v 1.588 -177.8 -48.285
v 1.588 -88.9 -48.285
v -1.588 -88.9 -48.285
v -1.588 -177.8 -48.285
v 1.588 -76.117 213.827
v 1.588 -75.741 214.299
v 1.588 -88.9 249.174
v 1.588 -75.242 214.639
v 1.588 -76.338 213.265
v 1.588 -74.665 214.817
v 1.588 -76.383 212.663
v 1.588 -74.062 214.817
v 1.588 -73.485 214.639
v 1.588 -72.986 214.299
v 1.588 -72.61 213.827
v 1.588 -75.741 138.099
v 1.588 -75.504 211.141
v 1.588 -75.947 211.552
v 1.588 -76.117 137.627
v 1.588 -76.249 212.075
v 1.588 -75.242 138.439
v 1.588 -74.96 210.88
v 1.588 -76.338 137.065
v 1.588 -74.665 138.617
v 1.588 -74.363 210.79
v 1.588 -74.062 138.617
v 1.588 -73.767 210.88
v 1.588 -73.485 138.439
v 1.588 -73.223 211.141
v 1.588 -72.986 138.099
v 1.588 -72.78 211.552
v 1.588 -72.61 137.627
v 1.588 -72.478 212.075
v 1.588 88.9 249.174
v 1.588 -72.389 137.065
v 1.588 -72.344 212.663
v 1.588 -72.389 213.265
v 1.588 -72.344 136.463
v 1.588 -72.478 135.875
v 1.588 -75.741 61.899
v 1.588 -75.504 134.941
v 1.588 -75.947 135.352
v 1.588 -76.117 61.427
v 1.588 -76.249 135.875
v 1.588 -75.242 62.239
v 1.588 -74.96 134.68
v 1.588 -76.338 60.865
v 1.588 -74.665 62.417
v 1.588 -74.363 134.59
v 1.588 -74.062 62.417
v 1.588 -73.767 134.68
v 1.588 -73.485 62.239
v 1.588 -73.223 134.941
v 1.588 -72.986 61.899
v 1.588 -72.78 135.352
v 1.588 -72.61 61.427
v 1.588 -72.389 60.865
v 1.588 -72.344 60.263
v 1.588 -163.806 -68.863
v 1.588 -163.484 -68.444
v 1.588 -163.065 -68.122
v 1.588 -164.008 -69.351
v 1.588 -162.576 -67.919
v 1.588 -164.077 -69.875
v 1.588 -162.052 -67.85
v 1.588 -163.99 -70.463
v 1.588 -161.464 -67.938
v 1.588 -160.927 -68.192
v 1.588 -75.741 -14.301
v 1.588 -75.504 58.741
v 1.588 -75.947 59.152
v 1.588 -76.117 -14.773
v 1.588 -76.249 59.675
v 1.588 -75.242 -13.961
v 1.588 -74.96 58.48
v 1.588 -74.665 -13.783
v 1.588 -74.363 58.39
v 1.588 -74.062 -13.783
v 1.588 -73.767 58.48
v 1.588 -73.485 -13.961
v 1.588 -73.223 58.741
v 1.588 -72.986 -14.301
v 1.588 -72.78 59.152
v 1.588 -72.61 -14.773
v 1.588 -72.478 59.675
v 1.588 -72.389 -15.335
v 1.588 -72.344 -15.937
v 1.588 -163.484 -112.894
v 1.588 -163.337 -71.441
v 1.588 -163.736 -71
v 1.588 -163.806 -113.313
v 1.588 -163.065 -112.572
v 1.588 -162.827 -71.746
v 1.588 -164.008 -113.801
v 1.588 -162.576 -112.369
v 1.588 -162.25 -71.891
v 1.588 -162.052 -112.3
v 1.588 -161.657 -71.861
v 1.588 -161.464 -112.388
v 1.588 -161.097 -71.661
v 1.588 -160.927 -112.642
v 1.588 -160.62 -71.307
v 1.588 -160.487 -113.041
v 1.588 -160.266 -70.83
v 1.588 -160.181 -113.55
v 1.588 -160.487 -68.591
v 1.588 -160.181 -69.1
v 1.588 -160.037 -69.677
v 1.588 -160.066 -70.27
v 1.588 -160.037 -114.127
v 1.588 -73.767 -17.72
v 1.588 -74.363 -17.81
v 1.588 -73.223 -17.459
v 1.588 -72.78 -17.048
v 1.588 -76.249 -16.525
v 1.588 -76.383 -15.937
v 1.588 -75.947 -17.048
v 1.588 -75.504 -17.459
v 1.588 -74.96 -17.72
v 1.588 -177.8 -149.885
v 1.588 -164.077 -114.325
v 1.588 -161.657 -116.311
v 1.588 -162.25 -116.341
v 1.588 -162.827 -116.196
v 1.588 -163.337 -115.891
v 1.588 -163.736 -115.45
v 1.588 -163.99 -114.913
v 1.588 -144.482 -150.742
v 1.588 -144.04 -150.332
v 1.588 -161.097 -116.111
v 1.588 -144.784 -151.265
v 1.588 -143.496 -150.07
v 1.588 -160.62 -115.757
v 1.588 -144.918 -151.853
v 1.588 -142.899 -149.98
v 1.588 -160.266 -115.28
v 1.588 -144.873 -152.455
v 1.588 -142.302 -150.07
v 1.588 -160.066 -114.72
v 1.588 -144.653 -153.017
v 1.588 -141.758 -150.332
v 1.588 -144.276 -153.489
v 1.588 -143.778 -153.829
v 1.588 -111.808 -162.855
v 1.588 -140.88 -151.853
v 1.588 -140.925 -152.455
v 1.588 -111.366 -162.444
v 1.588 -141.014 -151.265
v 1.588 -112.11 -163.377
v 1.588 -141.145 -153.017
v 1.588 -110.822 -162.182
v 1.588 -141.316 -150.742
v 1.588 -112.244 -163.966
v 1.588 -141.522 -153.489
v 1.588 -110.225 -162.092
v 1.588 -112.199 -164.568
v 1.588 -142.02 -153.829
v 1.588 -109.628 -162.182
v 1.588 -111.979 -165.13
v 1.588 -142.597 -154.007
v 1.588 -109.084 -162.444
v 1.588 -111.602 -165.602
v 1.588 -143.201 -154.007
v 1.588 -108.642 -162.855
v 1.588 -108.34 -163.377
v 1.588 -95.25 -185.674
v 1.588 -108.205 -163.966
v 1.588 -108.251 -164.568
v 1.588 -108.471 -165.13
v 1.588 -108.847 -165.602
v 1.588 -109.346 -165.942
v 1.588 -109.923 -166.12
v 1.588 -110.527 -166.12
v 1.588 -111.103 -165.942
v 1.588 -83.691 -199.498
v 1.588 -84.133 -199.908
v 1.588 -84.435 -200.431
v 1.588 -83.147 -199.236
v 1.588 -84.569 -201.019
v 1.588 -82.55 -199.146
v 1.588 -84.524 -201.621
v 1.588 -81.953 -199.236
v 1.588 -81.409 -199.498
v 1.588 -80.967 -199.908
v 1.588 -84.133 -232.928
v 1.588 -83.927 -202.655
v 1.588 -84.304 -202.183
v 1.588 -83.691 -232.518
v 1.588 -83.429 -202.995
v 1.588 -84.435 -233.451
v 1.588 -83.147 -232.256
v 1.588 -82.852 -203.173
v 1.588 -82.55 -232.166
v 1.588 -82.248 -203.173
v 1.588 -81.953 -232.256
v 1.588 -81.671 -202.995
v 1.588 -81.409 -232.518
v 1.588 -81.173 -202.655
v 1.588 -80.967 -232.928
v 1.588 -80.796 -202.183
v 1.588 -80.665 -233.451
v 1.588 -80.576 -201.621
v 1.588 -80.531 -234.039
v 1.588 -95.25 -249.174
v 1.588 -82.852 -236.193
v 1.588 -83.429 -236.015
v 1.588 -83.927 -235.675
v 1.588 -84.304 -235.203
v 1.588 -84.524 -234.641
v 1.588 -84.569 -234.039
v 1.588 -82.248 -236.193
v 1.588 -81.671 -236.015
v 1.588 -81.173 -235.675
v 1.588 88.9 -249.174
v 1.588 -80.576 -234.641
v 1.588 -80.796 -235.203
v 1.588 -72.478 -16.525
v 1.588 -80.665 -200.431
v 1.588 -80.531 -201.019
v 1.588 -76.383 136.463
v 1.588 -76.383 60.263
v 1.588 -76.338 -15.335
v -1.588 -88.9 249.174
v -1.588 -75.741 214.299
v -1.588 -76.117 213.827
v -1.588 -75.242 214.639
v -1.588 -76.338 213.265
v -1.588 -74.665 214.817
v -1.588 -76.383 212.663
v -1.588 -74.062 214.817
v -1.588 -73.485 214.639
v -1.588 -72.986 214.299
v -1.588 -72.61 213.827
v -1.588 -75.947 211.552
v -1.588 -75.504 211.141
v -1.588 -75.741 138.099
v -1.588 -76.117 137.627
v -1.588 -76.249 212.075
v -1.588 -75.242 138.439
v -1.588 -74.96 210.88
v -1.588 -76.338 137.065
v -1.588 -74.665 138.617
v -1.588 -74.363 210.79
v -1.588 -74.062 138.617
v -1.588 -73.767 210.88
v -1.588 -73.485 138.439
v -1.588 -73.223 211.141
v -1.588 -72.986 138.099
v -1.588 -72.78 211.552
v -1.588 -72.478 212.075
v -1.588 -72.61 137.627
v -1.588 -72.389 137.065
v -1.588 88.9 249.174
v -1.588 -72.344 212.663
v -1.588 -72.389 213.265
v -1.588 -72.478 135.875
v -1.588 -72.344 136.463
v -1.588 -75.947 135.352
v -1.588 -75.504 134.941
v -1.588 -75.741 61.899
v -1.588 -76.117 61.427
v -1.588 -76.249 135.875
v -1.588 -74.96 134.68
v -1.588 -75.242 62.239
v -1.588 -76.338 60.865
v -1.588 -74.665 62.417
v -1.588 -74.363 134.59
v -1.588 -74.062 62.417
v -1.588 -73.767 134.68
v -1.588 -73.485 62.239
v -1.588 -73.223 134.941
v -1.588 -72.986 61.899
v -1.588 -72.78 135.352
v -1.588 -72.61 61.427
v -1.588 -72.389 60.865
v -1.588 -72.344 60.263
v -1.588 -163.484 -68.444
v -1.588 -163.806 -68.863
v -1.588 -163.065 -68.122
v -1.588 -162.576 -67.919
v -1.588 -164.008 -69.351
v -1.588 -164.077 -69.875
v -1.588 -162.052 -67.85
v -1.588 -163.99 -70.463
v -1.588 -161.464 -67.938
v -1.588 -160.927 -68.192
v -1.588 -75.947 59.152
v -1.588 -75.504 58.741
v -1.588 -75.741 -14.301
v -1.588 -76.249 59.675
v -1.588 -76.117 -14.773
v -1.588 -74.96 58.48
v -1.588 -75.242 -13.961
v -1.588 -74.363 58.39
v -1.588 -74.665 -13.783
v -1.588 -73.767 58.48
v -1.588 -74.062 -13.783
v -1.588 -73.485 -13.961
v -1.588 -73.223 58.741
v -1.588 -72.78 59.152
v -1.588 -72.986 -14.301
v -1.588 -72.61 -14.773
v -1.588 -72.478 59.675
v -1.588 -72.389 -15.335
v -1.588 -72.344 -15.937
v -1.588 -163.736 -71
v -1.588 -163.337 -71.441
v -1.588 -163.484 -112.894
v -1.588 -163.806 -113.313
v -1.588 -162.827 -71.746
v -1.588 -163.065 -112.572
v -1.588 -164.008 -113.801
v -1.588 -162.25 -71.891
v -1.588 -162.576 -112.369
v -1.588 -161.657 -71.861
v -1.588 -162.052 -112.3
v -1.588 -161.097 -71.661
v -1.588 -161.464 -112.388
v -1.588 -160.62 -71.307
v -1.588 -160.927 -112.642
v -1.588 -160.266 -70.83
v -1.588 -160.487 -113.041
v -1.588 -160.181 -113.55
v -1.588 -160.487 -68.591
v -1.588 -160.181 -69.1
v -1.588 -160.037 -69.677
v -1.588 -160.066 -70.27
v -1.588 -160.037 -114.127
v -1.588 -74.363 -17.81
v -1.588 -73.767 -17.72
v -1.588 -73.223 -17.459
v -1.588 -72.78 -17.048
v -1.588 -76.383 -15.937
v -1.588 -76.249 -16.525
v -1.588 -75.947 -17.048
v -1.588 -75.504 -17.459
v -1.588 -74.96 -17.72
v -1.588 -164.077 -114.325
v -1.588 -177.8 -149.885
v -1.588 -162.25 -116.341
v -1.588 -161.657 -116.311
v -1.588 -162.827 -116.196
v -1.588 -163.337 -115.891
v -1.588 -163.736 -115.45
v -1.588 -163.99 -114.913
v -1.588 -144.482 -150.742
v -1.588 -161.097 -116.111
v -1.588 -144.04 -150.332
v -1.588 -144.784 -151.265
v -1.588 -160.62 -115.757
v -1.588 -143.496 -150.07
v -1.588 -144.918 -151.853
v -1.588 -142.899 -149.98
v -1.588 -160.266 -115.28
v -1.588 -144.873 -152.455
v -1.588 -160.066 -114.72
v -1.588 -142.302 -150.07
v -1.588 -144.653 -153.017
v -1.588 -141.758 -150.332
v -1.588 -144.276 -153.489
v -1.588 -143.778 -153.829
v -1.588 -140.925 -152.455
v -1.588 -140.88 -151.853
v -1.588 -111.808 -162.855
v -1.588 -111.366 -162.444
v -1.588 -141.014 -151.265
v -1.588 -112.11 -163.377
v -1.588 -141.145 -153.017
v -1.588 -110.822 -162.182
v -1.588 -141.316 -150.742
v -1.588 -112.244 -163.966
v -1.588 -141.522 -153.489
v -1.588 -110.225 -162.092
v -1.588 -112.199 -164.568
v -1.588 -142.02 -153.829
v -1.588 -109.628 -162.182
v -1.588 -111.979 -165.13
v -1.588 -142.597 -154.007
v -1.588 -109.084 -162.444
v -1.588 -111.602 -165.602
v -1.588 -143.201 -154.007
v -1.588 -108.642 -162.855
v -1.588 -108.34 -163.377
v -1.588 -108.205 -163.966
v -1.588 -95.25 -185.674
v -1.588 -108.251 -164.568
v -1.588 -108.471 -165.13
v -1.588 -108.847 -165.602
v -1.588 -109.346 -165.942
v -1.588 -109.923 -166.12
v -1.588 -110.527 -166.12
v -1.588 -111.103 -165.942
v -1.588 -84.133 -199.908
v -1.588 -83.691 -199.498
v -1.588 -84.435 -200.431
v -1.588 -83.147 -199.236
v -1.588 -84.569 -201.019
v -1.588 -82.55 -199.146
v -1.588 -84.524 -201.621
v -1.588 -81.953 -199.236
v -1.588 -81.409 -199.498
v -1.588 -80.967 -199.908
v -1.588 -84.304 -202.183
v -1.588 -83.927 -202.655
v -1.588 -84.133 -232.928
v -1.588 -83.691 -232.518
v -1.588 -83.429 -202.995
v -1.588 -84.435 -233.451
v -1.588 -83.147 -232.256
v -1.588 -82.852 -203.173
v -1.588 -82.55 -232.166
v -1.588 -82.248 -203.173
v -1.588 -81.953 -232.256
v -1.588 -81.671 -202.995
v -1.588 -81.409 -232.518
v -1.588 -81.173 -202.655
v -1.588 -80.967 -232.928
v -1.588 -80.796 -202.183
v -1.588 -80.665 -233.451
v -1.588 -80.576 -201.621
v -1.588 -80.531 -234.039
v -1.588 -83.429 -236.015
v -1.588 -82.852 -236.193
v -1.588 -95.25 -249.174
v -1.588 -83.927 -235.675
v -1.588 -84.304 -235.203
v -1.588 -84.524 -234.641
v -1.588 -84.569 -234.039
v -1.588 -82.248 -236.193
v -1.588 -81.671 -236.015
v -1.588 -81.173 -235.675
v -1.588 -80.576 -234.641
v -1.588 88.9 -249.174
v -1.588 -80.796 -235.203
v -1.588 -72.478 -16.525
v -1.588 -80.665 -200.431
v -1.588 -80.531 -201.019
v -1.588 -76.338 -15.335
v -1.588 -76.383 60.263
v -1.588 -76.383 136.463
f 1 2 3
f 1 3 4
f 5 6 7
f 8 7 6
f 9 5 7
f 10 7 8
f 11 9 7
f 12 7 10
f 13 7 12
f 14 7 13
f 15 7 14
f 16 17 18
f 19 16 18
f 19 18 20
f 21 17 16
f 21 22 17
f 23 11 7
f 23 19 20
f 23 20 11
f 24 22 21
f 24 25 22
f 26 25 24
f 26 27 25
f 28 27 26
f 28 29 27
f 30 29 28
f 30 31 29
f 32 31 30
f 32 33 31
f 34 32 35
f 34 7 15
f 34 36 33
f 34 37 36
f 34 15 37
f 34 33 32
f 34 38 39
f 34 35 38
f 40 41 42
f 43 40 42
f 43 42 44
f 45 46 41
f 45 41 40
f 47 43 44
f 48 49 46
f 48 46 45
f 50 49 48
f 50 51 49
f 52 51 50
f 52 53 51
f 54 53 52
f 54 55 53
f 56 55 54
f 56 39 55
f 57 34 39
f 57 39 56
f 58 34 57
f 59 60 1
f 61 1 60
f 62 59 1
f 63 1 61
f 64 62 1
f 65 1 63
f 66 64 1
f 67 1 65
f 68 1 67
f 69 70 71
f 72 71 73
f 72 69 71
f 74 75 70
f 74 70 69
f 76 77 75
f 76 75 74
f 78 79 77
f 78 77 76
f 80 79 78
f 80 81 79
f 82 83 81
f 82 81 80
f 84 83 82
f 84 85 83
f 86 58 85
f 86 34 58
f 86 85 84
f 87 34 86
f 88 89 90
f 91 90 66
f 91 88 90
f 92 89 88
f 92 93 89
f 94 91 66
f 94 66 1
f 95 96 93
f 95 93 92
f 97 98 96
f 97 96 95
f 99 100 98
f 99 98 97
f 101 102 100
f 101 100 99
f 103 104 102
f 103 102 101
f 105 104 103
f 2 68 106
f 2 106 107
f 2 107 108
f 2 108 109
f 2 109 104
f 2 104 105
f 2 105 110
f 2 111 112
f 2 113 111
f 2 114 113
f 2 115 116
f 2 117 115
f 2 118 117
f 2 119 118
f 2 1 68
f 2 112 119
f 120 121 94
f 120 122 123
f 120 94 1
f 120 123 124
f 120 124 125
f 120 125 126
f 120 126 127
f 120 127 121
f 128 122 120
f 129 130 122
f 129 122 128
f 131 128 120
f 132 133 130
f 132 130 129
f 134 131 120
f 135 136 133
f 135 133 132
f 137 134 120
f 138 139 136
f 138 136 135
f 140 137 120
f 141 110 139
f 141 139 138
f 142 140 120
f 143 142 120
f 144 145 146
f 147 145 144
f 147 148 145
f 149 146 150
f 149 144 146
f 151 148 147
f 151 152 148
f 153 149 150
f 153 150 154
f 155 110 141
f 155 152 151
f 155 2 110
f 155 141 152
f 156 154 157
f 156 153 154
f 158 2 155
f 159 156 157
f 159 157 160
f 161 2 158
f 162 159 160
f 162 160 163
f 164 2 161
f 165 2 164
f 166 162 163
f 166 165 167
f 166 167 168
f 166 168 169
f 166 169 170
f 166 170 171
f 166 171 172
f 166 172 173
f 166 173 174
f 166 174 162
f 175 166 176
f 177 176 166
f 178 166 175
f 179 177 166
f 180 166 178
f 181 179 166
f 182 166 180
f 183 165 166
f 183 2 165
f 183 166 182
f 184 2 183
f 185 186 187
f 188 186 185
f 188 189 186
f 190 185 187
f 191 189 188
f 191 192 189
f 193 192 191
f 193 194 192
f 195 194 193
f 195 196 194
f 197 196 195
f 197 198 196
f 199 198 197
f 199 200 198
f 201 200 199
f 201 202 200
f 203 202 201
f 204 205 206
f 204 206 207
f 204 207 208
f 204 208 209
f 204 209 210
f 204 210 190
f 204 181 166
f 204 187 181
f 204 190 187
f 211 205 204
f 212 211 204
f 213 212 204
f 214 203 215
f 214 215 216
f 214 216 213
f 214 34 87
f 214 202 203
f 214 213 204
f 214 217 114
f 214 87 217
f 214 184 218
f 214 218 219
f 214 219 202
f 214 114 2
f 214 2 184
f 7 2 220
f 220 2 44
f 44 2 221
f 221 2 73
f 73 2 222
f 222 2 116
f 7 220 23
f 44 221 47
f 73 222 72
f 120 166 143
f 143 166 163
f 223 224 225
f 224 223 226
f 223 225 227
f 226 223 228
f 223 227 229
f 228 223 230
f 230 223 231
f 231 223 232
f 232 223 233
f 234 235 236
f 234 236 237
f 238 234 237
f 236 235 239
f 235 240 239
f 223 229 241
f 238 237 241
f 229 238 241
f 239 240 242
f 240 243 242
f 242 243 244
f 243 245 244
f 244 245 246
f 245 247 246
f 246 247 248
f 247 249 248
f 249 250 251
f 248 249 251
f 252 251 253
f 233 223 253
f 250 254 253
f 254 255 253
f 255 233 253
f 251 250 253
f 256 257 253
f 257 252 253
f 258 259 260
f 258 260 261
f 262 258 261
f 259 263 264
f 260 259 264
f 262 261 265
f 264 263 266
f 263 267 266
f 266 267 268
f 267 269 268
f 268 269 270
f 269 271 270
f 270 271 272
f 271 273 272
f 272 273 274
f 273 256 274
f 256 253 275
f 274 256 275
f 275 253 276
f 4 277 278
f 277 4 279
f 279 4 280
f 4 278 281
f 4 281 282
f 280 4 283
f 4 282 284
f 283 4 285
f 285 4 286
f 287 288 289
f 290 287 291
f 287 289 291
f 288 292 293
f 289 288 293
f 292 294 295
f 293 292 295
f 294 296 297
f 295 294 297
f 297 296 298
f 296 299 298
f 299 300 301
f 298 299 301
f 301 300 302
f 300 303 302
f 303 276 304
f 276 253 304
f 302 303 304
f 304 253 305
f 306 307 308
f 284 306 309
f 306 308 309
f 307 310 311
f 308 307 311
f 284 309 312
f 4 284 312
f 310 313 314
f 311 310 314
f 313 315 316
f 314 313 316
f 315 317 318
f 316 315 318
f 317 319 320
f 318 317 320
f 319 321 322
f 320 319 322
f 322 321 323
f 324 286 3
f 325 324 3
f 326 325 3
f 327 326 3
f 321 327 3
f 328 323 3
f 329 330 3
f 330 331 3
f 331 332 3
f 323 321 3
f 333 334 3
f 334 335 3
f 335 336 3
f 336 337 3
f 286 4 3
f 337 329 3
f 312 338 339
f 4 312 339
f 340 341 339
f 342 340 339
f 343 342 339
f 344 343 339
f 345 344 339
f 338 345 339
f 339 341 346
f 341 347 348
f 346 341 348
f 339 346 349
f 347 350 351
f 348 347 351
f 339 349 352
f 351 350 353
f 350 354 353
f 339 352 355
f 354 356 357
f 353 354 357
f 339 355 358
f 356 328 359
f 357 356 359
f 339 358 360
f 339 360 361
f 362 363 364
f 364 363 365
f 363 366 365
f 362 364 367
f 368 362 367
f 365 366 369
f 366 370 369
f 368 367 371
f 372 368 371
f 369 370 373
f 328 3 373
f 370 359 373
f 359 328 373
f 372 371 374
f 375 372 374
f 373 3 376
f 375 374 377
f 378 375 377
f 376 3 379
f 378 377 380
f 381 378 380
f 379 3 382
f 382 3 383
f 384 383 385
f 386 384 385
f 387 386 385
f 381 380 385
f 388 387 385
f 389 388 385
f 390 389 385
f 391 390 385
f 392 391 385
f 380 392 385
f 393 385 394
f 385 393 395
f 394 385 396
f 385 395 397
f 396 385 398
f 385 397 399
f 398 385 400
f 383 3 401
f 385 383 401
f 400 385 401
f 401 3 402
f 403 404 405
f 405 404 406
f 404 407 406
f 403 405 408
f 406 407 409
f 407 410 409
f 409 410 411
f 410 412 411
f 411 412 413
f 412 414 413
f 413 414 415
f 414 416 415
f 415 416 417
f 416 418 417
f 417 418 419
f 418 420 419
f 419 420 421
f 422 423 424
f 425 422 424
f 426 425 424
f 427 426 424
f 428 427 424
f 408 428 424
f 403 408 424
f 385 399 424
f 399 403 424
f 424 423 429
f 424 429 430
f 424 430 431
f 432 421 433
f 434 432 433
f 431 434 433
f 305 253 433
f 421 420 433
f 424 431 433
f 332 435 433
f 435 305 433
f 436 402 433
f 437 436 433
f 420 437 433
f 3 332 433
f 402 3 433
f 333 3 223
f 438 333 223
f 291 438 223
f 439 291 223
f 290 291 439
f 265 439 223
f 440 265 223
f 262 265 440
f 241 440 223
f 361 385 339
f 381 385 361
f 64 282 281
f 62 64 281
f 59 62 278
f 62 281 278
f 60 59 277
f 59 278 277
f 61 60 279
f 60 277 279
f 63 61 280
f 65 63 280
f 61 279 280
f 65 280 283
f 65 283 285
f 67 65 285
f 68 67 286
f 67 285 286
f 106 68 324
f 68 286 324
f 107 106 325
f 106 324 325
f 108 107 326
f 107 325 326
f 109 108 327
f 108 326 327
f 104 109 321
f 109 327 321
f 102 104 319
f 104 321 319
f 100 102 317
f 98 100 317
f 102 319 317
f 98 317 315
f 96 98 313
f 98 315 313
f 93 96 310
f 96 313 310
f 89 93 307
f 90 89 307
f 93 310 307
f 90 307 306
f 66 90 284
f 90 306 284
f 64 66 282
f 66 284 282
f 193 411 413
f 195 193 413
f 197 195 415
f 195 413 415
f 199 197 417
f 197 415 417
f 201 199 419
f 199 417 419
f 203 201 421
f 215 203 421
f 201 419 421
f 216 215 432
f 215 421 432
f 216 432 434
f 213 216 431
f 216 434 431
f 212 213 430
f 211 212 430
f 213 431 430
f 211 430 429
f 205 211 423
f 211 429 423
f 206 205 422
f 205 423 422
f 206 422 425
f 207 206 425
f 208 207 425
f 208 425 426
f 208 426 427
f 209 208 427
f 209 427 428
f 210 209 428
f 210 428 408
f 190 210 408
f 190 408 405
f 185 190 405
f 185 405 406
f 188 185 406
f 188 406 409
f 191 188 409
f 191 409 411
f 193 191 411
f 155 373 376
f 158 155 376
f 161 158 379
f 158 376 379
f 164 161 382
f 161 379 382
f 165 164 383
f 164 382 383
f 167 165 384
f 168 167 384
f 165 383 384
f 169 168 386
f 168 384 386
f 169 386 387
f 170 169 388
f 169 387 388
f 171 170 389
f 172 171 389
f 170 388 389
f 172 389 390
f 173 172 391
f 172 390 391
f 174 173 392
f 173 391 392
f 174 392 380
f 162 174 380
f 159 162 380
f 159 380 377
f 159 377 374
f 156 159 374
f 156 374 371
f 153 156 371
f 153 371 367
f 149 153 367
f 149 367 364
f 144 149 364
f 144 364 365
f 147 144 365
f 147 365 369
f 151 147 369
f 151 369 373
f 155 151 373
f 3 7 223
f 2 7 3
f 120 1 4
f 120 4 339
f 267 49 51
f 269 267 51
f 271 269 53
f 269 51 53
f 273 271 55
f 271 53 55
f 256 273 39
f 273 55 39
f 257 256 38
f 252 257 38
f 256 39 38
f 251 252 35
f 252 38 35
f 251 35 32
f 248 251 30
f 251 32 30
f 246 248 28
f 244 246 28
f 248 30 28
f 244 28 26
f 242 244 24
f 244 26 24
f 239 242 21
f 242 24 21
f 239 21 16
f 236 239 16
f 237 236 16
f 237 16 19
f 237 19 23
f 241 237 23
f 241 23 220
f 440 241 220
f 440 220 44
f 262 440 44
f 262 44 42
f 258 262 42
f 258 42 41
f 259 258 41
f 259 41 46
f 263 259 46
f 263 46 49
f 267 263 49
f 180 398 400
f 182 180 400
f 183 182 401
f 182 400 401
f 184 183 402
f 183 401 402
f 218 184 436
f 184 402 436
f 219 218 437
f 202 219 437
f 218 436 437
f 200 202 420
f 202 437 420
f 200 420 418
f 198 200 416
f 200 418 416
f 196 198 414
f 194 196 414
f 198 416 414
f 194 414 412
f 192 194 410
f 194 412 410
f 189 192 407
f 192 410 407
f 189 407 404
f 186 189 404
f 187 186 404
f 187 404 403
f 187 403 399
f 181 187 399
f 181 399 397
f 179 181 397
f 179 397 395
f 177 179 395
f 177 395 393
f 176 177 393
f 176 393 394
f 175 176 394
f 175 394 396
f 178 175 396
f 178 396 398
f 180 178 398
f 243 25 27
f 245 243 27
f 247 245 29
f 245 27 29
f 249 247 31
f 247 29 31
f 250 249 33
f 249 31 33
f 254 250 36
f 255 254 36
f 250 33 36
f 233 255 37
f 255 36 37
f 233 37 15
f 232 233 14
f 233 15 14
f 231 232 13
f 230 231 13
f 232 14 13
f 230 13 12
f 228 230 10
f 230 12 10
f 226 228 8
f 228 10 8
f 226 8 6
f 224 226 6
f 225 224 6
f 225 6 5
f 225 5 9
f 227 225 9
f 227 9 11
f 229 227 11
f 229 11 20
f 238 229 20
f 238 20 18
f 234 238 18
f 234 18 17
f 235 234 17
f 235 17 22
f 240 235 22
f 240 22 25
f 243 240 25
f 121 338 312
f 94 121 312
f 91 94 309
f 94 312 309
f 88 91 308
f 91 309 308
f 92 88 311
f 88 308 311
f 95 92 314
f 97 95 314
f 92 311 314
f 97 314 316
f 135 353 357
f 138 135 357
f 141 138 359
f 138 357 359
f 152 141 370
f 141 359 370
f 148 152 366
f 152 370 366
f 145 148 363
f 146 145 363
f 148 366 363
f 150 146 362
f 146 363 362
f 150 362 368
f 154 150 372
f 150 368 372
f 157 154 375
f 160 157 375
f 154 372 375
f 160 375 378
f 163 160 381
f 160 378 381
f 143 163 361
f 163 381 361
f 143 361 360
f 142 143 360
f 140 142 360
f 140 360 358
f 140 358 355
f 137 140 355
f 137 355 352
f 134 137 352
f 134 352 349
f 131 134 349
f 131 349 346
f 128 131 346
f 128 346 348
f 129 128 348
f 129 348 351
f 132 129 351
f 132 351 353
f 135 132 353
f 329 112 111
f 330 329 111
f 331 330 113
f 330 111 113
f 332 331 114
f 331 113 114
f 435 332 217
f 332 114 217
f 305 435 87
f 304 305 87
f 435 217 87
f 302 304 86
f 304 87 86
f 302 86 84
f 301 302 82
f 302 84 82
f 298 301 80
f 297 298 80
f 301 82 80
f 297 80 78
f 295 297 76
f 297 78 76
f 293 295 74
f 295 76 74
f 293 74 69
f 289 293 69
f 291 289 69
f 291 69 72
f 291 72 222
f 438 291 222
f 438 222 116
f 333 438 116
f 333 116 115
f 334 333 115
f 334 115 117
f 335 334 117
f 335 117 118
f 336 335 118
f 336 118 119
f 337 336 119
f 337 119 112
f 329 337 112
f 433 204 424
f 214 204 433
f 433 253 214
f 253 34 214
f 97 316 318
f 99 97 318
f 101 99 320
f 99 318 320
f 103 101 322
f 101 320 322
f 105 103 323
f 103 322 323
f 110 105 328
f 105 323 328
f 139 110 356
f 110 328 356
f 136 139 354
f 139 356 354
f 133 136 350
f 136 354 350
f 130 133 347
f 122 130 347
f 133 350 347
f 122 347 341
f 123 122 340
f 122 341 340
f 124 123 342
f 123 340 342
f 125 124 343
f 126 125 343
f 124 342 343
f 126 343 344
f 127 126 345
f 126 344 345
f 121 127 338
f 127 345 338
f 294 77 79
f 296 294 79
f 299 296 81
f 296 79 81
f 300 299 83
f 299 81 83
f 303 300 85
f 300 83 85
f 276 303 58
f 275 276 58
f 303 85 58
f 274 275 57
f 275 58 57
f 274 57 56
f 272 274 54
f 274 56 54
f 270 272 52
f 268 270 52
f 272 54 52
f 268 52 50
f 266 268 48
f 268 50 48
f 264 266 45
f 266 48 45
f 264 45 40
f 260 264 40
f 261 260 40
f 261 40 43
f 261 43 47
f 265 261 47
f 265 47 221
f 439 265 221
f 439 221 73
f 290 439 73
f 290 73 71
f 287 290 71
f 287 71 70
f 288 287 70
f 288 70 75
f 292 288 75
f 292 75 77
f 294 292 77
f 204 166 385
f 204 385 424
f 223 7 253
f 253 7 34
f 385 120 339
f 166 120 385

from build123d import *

# Parameters (mm, degrees)
SKETCH1_W           = 498.348
SKETCH1_H           = 177.8
BOSS_EXTRUDE1_DEPTH = 1.5875
BOSS_EXTRUDE2_DEPTH = 3.175
SKETCH3_R           = 2.025
CUT_EXTRUDE1_DEPTH  = 307.121875894
LPATTERN1_COUNT     = 4
LPATTERN1_PITCH     = 76.2
CUT_EXTRUDE2_DEPTH  = 307.121875894
LPATTERN2_COUNT     = 2
LPATTERN2_PITCH     = 44.45
SKETCH5_R           = 2.025
CUT_EXTRUDE3_DEPTH  = 307.121875894
SKETCH8_R           = 2.025
CUT_EXTRUDE5_DEPTH  = 307.121875894
SKETCH9_R           = 2.025
CUT_EXTRUDE6_DEPTH  = 307.121875894
LPATTERN4_COUNT     = 2
LPATTERN4_PITCH     = 33.02


with BuildPart() as part:
    # Sketch1 → Boss-Extrude1 (new, symmetric)
    with BuildSketch(Plane(origin=(0, 0, 0), x_dir=(0, 0, -1), z_dir=(1, 0, 0))):
        Rectangle(SKETCH1_W, SKETCH1_H)
    extrude(amount=BOSS_EXTRUDE1_DEPTH, both=True)

    # Sketch2 → Boss-Extrude2 (add)
    with BuildSketch(Plane(origin=(1.5875, 0, 0), x_dir=(0, 0, -1), z_dir=(1, 0, 0))):
        Polygon((249.174, -95.25), (249.174, -88.9), (48.2854, -88.9), (48.2854, -177.8), (149.8854, -177.8), (185.674, -95.25), align=None)
    extrude(amount=-BOSS_EXTRUDE2_DEPTH)

    # Sketch3 → Cut-Extrude1 (cut, through all)
    with BuildSketch(Plane(origin=(1.5875, 0, 0), x_dir=(0, 0, -1), z_dir=(1, 0, 0))):
        with Locations((15.7854, -74.363480824)):
            Circle(SKETCH3_R)
    cut_extrude1 = extrude(amount=-CUT_EXTRUDE1_DEPTH, mode=Mode.SUBTRACT)

    # LPattern1: Cut-Extrude1 ×4
    with Locations(*[(0, 0, i * LPATTERN1_PITCH) for i in range(1, LPATTERN1_COUNT)]):
        add(cut_extrude1, mode=Mode.SUBTRACT)

    # Sketch4 → Cut-Extrude2 (cut, through all)
    with BuildSketch(Plane.ZY.offset(1.5875)):
        with BuildLine():
            ThreePointArc((-67.8504, -162.052), (-71.307291232, -160.620108768), (-69.8754, -164.077))
            Line((-69.8754, -164.077), (-69.8754, -162.052))
            Line((-69.8754, -162.052), (-67.8504, -162.052))
        make_face()
        with BuildLine():
            Line((-69.8754, -162.052), (-69.8754, -164.077))
            ThreePointArc((-69.8754, -164.077), (-68.443508768, -163.483891232), (-67.8504, -162.052))
            Line((-67.8504, -162.052), (-69.8754, -162.052))
        make_face()
    cut_extrude2 = extrude(amount=-CUT_EXTRUDE2_DEPTH, mode=Mode.SUBTRACT)

    # LPattern2: Cut-Extrude2 ×2
    with Locations(*[(0, 0, -i * LPATTERN2_PITCH) for i in range(1, LPATTERN2_COUNT)]):
        add(cut_extrude2, mode=Mode.SUBTRACT)

    # Sketch5 → Cut-Extrude3 (cut, through all)
    with BuildSketch(Plane.ZY.offset(1.5875)):
        with Locations((-152.00472504, -142.898934489)):
            Circle(SKETCH5_R)
    extrude(amount=-CUT_EXTRUDE3_DEPTH, mode=Mode.SUBTRACT)

    # Sketch8 → Cut-Extrude5 (cut, through all)
    with BuildSketch(Plane.ZY.offset(1.5875)):
        with Locations((-164.117120252, -110.224827622)):
            Circle(SKETCH8_R)
    extrude(amount=-CUT_EXTRUDE5_DEPTH, mode=Mode.SUBTRACT)

    # Sketch9 → Cut-Extrude6 (cut, through all)
    with BuildSketch(Plane.ZY.offset(1.5875)):
        with Locations((-201.170653386, -82.55)):
            Circle(SKETCH9_R)
    cut_extrude6 = extrude(amount=-CUT_EXTRUDE6_DEPTH, mode=Mode.SUBTRACT)

    # LPattern4: Cut-Extrude6 ×2
    with Locations(*[(0, 0, -i * LPATTERN4_PITCH) for i in range(1, LPATTERN4_COUNT)]):
        add(cut_extrude6, mode=Mode.SUBTRACT)


solid = part.part
